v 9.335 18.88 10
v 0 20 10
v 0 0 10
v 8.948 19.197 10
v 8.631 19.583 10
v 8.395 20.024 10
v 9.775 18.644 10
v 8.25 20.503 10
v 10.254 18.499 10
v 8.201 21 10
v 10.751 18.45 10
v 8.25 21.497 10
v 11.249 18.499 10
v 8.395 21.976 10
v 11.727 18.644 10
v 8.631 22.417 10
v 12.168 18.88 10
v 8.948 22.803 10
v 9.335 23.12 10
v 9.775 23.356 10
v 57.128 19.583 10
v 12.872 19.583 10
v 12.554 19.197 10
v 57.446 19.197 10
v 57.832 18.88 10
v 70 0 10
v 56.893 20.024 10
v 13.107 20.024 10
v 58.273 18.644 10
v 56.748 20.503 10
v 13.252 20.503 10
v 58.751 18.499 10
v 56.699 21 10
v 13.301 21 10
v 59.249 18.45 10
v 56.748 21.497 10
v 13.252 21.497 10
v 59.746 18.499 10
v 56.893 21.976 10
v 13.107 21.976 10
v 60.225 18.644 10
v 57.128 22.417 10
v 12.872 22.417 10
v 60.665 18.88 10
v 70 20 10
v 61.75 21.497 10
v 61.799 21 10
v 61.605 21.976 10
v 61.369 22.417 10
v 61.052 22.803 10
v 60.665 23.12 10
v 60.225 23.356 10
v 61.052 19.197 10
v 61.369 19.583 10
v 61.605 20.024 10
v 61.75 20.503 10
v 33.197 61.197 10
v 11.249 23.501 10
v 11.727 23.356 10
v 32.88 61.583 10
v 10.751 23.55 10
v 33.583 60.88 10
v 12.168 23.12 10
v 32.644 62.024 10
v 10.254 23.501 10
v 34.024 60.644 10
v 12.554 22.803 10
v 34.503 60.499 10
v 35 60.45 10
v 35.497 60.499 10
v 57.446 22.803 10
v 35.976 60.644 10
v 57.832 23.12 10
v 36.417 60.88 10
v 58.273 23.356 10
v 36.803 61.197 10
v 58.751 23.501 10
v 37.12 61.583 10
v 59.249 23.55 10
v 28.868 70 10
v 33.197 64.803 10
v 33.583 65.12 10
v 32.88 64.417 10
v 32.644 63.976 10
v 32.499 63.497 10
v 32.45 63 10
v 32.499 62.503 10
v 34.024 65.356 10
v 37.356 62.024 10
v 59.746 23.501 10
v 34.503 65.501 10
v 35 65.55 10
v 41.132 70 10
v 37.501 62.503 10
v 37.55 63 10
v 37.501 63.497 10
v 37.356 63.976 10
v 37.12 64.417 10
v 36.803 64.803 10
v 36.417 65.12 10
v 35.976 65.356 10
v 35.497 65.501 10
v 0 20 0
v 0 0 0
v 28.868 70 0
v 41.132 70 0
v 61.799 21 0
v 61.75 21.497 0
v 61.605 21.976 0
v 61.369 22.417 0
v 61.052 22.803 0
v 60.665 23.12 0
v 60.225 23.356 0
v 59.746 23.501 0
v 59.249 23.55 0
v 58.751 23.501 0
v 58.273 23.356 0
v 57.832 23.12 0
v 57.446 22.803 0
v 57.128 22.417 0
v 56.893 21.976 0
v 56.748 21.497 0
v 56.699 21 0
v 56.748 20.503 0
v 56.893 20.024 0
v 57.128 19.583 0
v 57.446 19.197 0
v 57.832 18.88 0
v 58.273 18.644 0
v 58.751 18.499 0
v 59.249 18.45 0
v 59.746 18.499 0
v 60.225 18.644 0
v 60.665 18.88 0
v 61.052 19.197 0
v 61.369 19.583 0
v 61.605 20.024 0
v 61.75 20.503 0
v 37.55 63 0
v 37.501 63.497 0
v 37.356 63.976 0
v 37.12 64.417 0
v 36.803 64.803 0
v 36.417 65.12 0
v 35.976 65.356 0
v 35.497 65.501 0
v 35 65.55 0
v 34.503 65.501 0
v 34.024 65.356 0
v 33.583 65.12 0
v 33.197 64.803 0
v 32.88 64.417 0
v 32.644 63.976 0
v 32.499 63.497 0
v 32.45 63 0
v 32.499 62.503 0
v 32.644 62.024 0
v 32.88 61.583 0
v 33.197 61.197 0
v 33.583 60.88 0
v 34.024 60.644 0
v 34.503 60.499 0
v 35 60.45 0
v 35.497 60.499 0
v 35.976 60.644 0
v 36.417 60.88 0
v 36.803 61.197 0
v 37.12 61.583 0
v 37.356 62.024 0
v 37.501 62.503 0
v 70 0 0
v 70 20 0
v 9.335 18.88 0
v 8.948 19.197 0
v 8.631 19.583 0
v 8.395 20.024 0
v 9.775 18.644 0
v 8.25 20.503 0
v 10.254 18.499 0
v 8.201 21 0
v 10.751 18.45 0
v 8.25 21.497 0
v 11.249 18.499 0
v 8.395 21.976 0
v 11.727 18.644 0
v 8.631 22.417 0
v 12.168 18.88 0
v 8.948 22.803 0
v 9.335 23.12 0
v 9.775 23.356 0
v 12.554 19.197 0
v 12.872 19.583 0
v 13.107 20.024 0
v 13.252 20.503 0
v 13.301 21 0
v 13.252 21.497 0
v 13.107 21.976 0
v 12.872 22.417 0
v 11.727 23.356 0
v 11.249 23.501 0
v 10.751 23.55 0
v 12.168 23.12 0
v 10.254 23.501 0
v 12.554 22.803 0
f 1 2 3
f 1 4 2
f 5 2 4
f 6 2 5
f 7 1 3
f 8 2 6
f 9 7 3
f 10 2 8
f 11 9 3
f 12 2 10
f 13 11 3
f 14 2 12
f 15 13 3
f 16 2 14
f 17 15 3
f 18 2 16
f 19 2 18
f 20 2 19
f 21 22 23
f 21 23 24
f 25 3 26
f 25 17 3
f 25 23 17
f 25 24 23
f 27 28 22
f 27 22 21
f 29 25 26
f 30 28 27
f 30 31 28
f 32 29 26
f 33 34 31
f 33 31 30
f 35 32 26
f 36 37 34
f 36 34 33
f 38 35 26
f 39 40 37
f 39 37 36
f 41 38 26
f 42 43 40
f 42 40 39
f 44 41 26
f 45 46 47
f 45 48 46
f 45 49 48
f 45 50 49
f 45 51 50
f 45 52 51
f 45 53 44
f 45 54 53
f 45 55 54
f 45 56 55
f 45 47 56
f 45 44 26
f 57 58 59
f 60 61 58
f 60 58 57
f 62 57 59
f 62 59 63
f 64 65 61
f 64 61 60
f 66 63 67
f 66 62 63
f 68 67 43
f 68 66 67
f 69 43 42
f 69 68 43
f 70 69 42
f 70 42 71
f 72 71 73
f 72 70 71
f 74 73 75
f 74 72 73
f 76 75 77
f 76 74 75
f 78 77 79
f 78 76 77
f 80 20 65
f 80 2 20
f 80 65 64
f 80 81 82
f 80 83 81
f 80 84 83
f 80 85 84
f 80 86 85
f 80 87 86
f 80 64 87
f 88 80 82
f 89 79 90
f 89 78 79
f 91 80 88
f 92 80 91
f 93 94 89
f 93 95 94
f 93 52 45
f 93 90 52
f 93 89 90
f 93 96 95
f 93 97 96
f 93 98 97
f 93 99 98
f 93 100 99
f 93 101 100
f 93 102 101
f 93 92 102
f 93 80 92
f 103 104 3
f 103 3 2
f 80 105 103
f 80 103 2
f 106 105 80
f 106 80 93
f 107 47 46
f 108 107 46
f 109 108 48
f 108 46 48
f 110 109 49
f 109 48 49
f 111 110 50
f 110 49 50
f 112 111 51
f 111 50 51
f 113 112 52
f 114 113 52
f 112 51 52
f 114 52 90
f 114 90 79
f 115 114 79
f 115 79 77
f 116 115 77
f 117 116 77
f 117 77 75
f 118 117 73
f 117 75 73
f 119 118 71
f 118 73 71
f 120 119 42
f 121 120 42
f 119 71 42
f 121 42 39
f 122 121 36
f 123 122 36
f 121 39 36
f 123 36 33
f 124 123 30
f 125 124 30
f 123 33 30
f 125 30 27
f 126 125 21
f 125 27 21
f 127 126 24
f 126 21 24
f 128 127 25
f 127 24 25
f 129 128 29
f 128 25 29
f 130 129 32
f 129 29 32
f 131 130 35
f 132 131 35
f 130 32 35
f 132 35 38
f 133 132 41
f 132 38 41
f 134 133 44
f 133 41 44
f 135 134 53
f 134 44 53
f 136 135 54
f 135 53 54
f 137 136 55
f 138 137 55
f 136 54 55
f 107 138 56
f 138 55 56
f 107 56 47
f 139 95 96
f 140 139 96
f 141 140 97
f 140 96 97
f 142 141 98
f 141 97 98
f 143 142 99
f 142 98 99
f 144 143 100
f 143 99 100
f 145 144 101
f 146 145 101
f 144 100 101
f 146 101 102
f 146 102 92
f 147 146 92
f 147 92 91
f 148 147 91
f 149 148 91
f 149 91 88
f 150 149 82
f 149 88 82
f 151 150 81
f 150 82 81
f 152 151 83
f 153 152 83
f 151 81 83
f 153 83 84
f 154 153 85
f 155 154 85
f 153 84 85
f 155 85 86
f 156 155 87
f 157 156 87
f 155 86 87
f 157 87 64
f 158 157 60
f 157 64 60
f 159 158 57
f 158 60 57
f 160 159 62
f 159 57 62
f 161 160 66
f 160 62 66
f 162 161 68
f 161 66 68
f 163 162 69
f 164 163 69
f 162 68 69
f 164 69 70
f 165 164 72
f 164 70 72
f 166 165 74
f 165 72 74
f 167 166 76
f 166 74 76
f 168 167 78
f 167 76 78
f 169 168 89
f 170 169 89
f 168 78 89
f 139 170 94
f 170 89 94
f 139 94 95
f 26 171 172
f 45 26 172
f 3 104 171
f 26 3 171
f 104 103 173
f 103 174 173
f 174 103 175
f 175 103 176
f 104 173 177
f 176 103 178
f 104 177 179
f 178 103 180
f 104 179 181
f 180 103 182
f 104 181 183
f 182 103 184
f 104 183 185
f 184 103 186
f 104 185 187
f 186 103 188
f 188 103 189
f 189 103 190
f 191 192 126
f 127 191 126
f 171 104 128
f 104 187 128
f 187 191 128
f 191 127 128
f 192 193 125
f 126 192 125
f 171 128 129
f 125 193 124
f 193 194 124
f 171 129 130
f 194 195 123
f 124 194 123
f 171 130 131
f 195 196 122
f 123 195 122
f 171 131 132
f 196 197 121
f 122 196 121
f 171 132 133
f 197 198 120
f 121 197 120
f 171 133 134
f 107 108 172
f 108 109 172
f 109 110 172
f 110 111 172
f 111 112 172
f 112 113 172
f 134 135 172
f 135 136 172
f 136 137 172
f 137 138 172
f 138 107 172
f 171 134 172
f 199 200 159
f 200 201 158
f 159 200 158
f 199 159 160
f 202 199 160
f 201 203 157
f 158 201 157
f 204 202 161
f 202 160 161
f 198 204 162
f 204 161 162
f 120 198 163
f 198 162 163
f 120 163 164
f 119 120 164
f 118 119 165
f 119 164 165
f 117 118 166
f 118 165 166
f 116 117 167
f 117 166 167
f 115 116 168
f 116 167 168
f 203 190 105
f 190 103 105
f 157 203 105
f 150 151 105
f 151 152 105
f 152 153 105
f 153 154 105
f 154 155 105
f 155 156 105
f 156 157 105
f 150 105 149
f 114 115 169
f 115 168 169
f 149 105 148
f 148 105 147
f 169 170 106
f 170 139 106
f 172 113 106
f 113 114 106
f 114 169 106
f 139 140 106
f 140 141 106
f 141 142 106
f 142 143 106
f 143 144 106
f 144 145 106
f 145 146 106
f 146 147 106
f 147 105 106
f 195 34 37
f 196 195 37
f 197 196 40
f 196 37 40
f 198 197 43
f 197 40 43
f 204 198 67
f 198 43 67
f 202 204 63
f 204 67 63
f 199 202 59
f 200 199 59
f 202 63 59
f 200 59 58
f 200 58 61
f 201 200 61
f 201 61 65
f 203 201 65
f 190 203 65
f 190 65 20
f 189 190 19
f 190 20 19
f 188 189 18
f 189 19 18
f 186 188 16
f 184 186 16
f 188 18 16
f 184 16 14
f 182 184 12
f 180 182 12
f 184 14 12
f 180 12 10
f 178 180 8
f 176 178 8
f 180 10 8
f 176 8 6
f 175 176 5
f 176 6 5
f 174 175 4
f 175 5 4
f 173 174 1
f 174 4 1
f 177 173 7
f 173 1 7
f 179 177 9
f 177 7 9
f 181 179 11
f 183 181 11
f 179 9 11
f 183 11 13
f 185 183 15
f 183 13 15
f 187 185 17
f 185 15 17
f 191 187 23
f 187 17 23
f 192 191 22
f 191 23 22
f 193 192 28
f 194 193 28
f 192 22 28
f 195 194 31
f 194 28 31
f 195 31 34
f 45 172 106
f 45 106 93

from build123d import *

# Parameters (mm, degrees)
SKIZZE2_W                       = 70
SKIZZE2_H                       = 70
AUFSATZ_LINEAR_AUSTRAGEN2_DEPTH = 10
SKIZZE5_R                       = 2.55
SCHNITT_LINEAR_AUSTRAGEN1_DEPTH = 10
FASE2_SIZE                      = 50
FASE2_SIZE2                     = 28.867513459
FASE3_SIZE                      = 50
FASE3_SIZE2                     = 28.867513459


with BuildPart() as part:
    # Skizze2 → Aufsatz-Linear austragen2 (new body)
    with BuildSketch(Plane.XY):
        with Locations((35, 35)):
            Rectangle(SKIZZE2_W, SKIZZE2_H)
    extrude(amount=AUFSATZ_LINEAR_AUSTRAGEN2_DEPTH)

    # Skizze5 → Schnitt-Linear austragen1 (cut)
    with BuildSketch(Plane.XY.offset(10)):
        with Locations((35, 63)):
            Circle(SKIZZE5_R)
        with Locations((59.248711306, 21)):
            Circle(SKIZZE5_R)
        with Locations((10.751288694, 21)):
            Circle(SKIZZE5_R)
    extrude(amount=-SCHNITT_LINEAR_AUSTRAGEN1_DEPTH, mode=Mode.SUBTRACT)

    # Fase2
    fase2_edges = [part.edges().sort_by_distance(p)[0] for p in [
        (70, 70, 5),
    ]]
    fase2_side = [part.faces().sort_by_distance(p)[0] for p in [
        (70, 35, 5),
    ]]
    chamfer(fase2_edges, length=FASE2_SIZE, length2=FASE2_SIZE2, reference=fase2_side[0])

    # Fase3
    fase3_edges = [part.edges().sort_by_distance(p)[0] for p in [
        (0, 70, 5),
    ]]
    fase3_side = [part.faces().sort_by_distance(p)[0] for p in [
        (0, 35, 5),
    ]]
    chamfer(fase3_edges, length=FASE3_SIZE, length2=FASE3_SIZE2, reference=fase3_side[0])


solid = part.part
